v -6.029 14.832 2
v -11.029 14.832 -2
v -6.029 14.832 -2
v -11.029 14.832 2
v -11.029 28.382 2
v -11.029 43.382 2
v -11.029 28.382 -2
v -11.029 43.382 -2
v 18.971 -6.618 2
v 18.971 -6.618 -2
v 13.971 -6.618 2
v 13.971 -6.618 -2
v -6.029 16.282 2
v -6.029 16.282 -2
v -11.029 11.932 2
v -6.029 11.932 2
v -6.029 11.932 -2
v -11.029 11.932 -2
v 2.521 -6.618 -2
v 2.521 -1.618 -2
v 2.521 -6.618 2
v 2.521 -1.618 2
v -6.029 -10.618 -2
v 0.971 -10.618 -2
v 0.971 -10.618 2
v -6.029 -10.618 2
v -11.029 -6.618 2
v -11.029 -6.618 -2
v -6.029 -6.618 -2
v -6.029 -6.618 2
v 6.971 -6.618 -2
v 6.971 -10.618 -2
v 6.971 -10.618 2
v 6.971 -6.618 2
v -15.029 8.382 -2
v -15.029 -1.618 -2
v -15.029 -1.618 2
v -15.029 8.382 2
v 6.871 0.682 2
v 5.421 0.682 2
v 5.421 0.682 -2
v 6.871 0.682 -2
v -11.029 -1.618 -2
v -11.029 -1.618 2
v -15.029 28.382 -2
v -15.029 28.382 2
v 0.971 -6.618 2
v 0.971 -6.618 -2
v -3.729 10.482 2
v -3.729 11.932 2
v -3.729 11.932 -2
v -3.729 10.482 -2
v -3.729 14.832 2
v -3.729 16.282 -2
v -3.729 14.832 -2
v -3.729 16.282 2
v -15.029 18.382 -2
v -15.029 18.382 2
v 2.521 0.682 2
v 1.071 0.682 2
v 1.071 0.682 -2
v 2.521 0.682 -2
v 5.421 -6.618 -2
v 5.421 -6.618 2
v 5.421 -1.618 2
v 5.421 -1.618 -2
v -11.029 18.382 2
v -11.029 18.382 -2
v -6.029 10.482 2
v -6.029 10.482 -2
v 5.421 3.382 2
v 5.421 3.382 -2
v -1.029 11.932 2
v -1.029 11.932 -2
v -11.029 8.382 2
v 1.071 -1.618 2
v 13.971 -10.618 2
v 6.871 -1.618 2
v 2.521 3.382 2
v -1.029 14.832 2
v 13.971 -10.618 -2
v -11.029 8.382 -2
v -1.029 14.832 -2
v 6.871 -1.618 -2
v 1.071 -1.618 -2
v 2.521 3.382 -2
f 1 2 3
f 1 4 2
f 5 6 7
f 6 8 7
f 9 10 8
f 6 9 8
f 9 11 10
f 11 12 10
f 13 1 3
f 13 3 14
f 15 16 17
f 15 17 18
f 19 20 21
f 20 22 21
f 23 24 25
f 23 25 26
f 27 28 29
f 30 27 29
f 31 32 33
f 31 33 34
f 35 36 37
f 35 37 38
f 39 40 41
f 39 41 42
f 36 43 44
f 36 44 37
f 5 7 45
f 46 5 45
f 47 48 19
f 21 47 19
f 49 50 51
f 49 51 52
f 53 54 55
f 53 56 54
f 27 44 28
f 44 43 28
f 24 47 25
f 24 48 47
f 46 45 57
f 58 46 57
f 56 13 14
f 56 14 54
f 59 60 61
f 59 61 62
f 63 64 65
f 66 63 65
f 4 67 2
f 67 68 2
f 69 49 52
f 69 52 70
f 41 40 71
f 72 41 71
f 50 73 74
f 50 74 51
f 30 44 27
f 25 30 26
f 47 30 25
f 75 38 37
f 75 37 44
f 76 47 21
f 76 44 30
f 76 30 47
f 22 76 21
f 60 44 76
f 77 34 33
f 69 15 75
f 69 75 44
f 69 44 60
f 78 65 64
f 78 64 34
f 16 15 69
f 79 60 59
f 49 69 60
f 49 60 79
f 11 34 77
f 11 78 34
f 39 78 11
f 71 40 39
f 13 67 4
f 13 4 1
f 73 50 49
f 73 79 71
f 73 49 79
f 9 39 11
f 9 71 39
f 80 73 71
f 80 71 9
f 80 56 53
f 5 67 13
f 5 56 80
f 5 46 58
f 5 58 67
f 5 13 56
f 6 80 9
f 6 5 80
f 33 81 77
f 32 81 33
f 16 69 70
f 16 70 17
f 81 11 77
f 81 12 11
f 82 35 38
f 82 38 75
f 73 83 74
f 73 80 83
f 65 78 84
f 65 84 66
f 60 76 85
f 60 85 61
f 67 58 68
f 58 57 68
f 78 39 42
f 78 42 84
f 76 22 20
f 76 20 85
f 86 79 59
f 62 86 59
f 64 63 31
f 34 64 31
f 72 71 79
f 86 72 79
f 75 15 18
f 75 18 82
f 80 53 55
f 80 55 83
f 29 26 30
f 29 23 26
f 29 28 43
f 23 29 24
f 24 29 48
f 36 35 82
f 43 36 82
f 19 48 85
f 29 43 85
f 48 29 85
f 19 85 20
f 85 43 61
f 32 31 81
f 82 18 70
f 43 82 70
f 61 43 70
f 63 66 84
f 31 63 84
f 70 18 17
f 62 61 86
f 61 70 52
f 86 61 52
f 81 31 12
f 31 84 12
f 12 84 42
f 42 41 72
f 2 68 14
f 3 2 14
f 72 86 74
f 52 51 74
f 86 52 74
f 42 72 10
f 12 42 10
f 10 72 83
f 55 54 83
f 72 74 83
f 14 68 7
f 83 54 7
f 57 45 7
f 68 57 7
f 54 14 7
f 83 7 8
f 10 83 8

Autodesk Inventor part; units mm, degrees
sketch "Эскиз1" plane through (0, 0, 0) normal (0, 0, 1) x (1, 0, 0)
  line L0 (-11.0294, 43.3824) -> (-11.0294, -6.6176)
  line L1 (-11.0294, -6.6176) -> (18.9706, -6.6176)
  line L2 (18.9706, -6.6176) -> (-11.0294, 43.3824)
  line L3 (-11.0294, -6.6176) -> (11.0294, 6.6176) construction
  line L4 (-6.0294, -6.6176) -> (0.9706, -6.6176)
  line L5 (0.9706, -6.6176) -> (0.9706, -10.6176)
  line L6 (0.9706, -10.6176) -> (-6.0294, -10.6176)
  line L7 (-6.0294, -10.6176) -> (-6.0294, -6.6176)
  line L8 (6.9706, -6.6176) -> (13.9706, -6.6176)
  line L9 (13.9706, -6.6176) -> (13.9706, -10.6176)
  line L10 (13.9706, -10.6176) -> (6.9706, -10.6176)
  line L11 (6.9706, -10.6176) -> (6.9706, -6.6176)
  line L12 (-11.0294, 28.3824) -> (-15.0294, 28.3824)
  line L13 (-15.0294, 28.3824) -> (-15.0294, 18.3824)
  line L14 (-15.0294, 18.3824) -> (-11.0294, 18.3824)
  line L15 (-11.0294, 18.3824) -> (-11.0294, 28.3824)
  line L16 (-11.0294, -1.6176) -> (-15.0294, -1.6176)
  line L17 (-15.0294, -1.6176) -> (-15.0294, 8.3824)
  line L18 (-15.0294, 8.3824) -> (-11.0294, 8.3824)
  line L19 (-11.0294, 8.3824) -> (-11.0294, -1.6176)
  point P0 (0, 0)
  point P1 (0, 0)
  point P2 (-11.0294, 8.3824)
  point P3 (0.9706, -6.6176)
  dimension "d0" = 30
  dimension "d1" = 50
  dimension "d2" = 10
  dimension "d3" = 15
  dimension "d4" = 4
  dimension "d5" = 5
  dimension "d6" = 5
  dimension "d7" = 7
  dimension "d8" = 5
extrude "Выдавливание1" add sketch "Эскиз1" along normal mid plane 4
sketch "Эскиз2" plane through (0, 0, 2) normal (0, 0, 1) x (1, 0, 0)
  line L0 (-11.0294, 18.3824) -> (-11.0294, 8.3824) projected
  line L1 (-11.0294, 14.8324) -> (-1.0294, 14.8324)
  line L2 (-1.0294, 14.8324) -> (-1.0294, 11.9324)
  line L3 (-1.0294, 11.9324) -> (-11.0294, 11.9324)
  line L4 (-11.0294, 11.9324) -> (-11.0294, 14.8324)
  line L5 (0.9706, -6.6176) -> (6.9706, -6.6176) projected
  line L6 (2.5206, -6.6176) -> (5.4206, -6.6176)
  line L7 (5.4206, -6.6176) -> (5.4206, 3.3824)
  line L8 (5.4206, 3.3824) -> (2.5206, 3.3824)
  line L9 (2.5206, 3.3824) -> (2.5206, -6.6176)
  line L10 (-6.0294, 16.2824) -> (-3.7294, 16.2824)
  line L11 (-3.7294, 16.2824) -> (-3.7294, 10.4824)
  line L12 (-3.7294, 10.4824) -> (-6.0294, 10.4824)
  line L13 (-6.0294, 10.4824) -> (-6.0294, 16.2824)
  line L14 (1.0706, 0.6824) -> (6.8706, 0.6824)
  line L15 (6.8706, 0.6824) -> (6.8706, -1.6176)
  line L16 (6.8706, -1.6176) -> (1.0706, -1.6176)
  line L17 (1.0706, -1.6176) -> (1.0706, 0.6824)
  line L18 (-11.0294, 13.3824) -> (-1.0294, 13.3824) construction
  line L19 (3.9706, 3.3824) -> (3.9706, -6.6176) construction
  point P0 (0, 0)
  point P1 (-3.7294, 13.3824)
  point P2 (3.9706, 0.6824)
  point P3 (-6.0294, 14.8324)
  point P4 (-11.0294, 11.9324)
  point P5 (-6.0294, 11.9324)
  point P6 (-3.7294, 11.9324)
  point P7 (-3.7294, 14.8324)
  point P8 (2.5206, -1.6176)
  point P9 (5.4206, -1.6176)
  point P10 (5.4206, 0.6824)
  point P11 (2.5206, 0.6824)
  dimension "d11" = 2.9
  dimension "d12" = 10
  dimension "d13" = 2.3
  dimension "d14" = 5.8
  dimension "d15" = 5
  dimension "d16" = 5
extrude "Выдавливание2" cut sketch "Эскиз2" against normal up to next
properties part number "Рёбра_жёсткости"
